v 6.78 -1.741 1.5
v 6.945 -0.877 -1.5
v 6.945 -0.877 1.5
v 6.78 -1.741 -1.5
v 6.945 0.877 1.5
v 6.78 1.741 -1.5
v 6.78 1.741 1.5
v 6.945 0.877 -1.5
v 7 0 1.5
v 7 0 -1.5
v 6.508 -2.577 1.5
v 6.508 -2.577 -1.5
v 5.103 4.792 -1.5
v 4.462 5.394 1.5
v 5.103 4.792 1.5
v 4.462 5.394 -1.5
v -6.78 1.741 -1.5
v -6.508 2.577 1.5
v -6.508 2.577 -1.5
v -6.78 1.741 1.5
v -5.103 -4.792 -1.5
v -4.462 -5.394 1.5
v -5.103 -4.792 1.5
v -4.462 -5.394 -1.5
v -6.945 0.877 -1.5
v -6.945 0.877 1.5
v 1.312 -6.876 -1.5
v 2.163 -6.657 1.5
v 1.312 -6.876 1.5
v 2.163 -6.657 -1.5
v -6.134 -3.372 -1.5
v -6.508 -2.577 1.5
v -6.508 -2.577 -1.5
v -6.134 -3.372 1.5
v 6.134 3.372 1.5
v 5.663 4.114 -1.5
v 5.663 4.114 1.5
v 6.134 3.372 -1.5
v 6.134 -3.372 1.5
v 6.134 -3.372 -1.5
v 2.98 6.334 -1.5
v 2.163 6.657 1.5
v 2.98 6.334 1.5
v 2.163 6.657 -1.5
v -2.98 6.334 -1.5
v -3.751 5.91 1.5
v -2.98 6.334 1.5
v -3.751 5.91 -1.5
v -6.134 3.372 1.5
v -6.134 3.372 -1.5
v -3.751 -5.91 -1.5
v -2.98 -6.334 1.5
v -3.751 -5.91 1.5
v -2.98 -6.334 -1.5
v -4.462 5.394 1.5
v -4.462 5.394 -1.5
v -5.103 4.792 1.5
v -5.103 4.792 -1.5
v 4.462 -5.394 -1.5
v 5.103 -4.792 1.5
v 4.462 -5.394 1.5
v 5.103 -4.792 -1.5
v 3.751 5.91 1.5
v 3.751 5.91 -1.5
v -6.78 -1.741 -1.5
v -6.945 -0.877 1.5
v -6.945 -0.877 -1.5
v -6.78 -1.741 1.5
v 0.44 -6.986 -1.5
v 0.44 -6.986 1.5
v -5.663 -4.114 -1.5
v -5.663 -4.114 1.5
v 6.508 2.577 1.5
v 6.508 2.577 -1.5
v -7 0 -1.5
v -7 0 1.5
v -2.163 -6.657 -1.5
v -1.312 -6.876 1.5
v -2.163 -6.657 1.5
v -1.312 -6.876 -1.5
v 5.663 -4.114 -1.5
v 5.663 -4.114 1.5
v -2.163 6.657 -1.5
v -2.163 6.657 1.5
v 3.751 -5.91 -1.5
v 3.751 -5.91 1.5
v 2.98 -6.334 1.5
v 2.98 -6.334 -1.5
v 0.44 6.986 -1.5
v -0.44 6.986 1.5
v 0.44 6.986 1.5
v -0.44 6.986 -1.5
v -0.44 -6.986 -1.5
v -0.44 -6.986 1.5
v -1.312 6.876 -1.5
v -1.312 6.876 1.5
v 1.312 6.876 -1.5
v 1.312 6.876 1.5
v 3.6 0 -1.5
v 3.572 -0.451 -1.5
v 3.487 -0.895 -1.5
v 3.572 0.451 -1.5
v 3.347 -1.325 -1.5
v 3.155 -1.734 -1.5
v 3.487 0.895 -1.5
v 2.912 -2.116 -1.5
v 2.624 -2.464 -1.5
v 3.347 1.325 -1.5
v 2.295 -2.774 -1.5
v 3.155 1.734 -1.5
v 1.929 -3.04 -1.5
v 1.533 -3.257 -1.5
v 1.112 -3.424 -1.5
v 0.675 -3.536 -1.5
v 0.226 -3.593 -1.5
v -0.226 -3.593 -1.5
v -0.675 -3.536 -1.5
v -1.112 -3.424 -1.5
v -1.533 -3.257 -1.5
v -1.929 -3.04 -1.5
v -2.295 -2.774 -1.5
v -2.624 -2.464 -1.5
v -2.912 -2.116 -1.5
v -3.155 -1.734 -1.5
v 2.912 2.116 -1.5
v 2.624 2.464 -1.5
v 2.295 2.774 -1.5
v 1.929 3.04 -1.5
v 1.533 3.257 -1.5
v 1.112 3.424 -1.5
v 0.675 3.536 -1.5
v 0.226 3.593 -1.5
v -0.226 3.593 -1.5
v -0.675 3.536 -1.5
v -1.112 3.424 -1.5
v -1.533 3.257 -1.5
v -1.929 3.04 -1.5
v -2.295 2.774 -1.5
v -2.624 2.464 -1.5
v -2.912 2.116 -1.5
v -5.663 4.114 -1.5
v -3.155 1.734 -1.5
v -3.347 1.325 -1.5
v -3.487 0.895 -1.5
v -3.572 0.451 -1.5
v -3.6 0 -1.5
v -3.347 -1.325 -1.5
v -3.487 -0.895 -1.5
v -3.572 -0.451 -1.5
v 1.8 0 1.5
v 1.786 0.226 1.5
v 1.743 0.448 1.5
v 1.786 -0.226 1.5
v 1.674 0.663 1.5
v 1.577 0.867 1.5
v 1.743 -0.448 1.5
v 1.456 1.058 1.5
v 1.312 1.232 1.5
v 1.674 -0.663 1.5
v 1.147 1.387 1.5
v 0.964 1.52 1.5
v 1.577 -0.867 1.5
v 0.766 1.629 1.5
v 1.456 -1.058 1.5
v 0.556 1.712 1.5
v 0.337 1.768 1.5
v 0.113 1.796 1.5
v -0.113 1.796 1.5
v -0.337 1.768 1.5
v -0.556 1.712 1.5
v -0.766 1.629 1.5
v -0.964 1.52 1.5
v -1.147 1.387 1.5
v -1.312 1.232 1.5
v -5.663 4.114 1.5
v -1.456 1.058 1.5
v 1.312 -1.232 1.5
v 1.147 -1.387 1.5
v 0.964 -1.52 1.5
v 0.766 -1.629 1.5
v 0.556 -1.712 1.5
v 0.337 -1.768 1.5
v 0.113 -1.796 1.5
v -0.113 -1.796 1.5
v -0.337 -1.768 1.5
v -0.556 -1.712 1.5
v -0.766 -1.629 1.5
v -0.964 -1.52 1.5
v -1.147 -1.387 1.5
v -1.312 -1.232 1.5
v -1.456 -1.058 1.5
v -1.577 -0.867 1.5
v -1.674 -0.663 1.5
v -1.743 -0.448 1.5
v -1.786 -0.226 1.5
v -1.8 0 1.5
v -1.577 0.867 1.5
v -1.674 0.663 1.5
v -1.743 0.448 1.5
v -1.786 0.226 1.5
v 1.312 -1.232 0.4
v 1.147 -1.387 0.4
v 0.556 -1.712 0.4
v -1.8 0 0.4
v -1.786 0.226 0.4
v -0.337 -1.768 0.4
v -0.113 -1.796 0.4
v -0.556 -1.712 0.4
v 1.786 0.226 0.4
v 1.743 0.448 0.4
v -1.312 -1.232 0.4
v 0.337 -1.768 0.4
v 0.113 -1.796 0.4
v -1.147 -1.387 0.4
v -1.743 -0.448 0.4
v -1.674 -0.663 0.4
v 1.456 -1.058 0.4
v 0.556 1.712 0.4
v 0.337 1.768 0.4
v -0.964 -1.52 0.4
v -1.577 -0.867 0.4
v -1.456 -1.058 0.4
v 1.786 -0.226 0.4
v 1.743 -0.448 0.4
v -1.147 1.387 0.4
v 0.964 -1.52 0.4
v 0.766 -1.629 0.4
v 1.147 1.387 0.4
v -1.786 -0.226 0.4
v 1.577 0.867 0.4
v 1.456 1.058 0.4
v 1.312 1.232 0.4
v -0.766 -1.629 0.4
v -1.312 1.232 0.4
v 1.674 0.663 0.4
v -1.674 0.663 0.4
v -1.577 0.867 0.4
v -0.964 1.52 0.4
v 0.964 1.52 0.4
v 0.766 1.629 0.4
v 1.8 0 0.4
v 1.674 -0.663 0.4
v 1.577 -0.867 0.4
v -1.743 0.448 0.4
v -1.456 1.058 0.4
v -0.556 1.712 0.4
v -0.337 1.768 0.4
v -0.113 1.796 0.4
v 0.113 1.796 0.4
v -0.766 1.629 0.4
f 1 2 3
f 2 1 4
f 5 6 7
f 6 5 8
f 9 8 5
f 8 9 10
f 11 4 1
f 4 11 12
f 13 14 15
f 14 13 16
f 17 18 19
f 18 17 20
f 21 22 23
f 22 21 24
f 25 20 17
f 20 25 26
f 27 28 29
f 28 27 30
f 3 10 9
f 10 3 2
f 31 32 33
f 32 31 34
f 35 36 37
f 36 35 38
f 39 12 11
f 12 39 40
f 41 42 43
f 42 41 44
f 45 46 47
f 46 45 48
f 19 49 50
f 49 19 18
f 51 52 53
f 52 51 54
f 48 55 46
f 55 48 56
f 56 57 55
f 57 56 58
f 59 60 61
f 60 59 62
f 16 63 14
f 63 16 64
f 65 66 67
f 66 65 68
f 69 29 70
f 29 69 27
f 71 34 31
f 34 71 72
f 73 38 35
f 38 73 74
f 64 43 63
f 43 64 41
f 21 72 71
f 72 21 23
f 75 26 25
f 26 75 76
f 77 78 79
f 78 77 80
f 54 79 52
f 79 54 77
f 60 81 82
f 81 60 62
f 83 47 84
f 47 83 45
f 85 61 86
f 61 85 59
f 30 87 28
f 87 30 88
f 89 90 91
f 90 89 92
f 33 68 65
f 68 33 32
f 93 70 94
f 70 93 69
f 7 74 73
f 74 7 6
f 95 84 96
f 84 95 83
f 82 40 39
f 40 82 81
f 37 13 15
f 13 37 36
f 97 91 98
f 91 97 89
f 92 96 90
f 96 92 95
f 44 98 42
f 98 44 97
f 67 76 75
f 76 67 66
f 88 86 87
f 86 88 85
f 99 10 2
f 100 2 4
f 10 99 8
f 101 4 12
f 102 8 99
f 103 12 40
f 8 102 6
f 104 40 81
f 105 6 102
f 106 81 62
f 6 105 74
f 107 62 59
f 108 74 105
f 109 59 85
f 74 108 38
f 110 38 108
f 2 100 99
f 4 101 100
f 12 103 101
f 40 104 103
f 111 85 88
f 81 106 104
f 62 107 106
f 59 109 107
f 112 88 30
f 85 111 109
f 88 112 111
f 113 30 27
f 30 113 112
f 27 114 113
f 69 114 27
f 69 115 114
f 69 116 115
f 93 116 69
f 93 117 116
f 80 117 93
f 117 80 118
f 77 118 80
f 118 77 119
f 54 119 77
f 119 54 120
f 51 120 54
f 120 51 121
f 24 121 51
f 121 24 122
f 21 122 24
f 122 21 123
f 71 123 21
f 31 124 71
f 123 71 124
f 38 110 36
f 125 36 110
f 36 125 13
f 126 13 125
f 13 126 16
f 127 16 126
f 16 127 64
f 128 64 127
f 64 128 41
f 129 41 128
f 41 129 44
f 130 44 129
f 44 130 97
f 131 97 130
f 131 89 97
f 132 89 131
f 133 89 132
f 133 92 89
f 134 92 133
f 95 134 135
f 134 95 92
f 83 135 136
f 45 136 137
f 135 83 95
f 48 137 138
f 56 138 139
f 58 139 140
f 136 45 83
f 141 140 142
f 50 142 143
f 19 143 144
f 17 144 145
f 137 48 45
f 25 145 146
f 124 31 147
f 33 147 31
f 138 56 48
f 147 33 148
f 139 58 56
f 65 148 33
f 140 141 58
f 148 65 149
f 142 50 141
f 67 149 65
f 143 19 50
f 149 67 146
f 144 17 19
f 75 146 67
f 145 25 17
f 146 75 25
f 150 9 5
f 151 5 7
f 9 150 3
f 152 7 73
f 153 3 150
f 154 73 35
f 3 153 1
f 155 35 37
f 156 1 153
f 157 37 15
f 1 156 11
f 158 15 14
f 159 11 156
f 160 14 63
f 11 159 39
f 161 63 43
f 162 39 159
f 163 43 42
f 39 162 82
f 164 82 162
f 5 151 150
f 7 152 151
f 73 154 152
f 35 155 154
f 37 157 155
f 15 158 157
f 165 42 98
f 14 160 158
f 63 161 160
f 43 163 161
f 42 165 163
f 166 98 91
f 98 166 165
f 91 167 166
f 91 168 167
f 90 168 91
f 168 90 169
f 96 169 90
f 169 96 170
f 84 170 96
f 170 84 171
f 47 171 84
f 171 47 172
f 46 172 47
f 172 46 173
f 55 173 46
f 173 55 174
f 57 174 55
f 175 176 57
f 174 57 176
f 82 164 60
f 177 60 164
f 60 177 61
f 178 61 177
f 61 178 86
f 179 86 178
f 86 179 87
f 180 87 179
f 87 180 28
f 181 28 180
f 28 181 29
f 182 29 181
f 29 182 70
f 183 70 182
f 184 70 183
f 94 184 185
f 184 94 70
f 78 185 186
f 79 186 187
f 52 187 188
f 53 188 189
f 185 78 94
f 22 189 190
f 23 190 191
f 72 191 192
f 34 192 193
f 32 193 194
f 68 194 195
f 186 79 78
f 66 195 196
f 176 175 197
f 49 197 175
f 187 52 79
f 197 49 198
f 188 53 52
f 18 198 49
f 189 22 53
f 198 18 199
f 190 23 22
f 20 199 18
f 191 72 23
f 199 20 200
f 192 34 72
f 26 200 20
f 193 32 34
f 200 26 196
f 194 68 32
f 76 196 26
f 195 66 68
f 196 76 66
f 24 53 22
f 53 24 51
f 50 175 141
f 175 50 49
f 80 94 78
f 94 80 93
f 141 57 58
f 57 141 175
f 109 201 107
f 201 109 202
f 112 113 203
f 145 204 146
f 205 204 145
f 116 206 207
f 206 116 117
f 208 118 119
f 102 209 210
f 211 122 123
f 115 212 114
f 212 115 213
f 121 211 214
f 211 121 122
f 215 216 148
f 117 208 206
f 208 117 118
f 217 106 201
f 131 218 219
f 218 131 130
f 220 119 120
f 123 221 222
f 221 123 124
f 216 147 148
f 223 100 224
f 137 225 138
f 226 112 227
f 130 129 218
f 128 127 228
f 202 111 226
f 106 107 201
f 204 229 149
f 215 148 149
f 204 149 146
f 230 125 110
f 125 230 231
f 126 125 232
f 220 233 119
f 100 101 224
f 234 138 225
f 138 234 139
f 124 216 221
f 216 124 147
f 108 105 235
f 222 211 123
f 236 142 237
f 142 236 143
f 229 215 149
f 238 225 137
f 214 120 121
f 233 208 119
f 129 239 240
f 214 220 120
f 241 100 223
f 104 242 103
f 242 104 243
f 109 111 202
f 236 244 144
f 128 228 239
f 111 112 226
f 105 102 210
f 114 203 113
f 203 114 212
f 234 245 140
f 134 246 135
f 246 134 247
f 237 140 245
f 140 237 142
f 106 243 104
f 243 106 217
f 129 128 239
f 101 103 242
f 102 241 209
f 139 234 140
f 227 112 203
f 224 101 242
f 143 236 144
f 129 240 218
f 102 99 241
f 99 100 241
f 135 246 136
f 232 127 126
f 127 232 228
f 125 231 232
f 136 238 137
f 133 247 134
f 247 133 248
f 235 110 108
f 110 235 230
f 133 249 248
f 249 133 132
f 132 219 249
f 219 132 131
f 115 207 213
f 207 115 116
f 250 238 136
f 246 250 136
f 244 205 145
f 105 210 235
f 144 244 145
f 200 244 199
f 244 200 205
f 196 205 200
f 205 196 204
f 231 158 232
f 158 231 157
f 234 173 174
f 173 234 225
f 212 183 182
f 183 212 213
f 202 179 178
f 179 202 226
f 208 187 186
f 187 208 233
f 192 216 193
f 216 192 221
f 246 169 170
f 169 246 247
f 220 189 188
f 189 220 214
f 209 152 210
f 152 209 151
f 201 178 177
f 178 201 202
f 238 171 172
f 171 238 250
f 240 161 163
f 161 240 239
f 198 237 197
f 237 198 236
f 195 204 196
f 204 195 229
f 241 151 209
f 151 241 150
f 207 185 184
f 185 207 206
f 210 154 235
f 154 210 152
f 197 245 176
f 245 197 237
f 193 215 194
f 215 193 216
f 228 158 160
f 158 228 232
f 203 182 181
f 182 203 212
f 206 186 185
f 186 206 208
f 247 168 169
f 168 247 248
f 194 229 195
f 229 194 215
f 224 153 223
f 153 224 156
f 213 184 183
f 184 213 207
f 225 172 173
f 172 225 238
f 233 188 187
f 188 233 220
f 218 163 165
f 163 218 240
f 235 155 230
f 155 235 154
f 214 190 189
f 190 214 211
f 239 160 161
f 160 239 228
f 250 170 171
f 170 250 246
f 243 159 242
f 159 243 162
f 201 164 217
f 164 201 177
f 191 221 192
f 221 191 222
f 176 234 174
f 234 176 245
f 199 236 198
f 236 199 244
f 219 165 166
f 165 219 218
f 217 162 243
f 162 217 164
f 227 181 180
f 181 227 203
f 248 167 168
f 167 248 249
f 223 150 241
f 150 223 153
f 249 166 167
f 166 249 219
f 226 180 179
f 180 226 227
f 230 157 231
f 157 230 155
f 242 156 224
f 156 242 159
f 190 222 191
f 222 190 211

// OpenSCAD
$fn = 50;


difference() {
	union() {
		translate(v = [0, 0, -1.5000000000]) {
			cylinder(h = 3, r = 7.0000000000);
		}
		translate(v = [0, 0, -1.5000000000]) {
			cylinder(h = 3, r = 2.8500000000);
		}
	}
	union() {
		translate(v = [0, 0, -1.5000000000]) {
			rotate(a = [0, 180, 0]) {
				difference() {
					union() {
						translate(v = [0, 0, -3.0000000000]) {
							cylinder(h = 3, r = 1.5000000000);
						}
						translate(v = [0, 0, -1.9000000000]) {
							cylinder(h = 1.9000000000, r1 = 1.8000000000, r2 = 3.6000000000);
						}
						translate(v = [0, 0, -3.0000000000]) {
							cylinder(h = 3, r = 1.8000000000);
						}
						translate(v = [0, 0, -3.0000000000]) {
							cylinder(h = 3, r = 1.5000000000);
						}
					}
					union();
				}
			}
		}
		translate(v = [0, 0, -100.0000000000]) {
			cylinder(h = 200, r = 1.8000000000);
		}
	}
}
